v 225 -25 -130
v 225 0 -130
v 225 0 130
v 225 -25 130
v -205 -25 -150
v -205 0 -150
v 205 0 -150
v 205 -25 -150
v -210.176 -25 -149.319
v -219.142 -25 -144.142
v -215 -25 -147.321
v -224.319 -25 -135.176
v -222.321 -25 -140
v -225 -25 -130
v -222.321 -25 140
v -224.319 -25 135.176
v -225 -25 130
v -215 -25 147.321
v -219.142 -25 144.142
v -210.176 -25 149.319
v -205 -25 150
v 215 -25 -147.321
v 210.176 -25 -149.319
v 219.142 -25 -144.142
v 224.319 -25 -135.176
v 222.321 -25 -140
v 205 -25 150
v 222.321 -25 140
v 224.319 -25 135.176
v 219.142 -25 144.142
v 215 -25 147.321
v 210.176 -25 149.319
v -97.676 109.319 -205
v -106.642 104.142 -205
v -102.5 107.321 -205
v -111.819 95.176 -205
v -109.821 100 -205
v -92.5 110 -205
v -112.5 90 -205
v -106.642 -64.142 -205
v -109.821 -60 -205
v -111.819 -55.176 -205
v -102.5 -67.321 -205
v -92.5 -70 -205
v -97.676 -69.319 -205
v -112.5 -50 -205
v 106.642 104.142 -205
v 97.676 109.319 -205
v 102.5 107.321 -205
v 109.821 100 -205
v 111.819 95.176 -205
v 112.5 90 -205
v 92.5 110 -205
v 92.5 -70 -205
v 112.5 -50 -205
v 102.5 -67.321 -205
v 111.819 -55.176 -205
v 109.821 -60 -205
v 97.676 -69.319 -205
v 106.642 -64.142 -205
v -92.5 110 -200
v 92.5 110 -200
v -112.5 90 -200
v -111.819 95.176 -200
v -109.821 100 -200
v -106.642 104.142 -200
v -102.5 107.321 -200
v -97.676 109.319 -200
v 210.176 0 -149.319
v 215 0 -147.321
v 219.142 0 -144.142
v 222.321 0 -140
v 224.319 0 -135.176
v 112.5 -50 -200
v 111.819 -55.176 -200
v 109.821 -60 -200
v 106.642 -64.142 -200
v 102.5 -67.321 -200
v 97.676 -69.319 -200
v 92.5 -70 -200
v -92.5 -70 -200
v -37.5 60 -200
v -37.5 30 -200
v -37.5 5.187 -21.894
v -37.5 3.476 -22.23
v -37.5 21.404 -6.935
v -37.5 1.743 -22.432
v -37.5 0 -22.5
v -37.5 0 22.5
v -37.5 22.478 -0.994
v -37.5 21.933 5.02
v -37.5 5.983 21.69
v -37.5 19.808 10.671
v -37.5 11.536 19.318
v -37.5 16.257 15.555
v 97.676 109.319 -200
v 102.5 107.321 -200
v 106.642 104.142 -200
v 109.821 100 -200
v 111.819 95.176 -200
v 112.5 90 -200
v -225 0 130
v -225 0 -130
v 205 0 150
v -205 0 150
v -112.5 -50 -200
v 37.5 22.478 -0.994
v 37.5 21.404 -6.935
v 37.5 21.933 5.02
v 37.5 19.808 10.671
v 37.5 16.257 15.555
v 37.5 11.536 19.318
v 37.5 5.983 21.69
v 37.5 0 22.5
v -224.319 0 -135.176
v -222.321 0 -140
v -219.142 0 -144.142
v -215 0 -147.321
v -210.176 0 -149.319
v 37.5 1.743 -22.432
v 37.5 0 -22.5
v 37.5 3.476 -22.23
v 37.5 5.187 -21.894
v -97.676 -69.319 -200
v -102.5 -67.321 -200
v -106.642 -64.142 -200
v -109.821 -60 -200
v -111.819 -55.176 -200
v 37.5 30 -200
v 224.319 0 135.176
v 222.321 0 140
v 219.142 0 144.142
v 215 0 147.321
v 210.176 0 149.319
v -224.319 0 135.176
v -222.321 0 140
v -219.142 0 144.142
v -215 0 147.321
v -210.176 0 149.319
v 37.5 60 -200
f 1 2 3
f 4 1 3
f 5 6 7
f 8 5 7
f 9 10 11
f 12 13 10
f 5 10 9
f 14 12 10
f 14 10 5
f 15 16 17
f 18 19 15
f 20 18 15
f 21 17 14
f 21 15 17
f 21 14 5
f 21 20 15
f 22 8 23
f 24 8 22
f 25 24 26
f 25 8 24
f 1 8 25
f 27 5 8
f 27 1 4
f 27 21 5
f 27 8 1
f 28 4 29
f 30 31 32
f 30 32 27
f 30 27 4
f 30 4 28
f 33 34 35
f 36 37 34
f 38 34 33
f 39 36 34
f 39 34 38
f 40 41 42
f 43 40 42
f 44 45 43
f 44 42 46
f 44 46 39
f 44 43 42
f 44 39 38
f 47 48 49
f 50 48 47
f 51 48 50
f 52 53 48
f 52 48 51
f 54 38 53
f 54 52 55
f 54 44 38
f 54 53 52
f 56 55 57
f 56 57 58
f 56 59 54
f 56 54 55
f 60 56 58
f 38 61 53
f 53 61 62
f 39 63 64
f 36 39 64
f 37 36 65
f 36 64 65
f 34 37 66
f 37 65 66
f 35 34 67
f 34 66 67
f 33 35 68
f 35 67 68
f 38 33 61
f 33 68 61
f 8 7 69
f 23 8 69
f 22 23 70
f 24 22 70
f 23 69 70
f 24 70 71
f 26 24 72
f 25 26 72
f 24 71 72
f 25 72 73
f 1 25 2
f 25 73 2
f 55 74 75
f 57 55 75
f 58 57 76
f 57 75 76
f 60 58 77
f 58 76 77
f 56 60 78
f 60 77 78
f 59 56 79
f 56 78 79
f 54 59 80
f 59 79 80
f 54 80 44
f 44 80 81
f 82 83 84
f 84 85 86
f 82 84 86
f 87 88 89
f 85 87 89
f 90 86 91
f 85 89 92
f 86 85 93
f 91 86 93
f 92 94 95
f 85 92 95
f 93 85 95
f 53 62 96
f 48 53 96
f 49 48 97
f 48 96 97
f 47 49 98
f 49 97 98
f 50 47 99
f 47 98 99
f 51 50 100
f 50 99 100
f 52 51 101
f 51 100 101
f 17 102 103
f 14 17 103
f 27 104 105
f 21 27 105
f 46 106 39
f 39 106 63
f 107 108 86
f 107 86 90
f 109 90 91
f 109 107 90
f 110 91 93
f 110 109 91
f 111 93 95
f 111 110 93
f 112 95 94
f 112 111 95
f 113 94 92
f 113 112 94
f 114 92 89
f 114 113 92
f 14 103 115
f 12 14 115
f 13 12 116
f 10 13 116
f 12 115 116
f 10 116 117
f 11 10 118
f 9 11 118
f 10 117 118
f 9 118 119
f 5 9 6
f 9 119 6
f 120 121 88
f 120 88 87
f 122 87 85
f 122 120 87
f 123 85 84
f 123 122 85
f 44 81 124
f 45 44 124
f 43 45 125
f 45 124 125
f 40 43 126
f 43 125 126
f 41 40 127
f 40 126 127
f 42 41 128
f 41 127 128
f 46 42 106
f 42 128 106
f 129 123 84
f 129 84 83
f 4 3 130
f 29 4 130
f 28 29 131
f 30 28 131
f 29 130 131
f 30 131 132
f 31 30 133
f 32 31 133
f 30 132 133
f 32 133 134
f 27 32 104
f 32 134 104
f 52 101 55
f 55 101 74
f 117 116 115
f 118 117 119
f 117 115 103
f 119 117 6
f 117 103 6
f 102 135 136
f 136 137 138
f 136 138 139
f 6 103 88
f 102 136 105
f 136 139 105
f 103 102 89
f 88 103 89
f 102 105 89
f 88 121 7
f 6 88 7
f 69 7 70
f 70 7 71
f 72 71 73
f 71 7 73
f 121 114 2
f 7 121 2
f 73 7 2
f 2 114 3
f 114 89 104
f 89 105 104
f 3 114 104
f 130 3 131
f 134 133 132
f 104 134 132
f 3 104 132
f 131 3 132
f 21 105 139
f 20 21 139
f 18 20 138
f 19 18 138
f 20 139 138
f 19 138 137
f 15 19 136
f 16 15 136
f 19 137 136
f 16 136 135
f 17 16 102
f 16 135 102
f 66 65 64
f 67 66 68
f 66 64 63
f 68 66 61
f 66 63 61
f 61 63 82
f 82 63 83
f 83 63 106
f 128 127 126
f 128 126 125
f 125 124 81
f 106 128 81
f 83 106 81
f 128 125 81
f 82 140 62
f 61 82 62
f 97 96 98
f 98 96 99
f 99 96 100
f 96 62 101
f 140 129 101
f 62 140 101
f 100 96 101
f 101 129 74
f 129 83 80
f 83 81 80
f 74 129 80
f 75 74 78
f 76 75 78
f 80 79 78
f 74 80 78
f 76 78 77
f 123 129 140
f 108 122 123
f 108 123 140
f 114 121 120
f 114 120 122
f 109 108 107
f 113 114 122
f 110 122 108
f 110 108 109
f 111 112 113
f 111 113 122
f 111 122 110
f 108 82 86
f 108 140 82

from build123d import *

# Parameters (mm, degrees)
F1_DEPTH = 25
F3_DEPTH = 37.5
F5_DEPTH = 5


with BuildPart() as f1:
    # F0 (on Front) → F1 (new body)
    with BuildSketch(Plane.XZ):
        with BuildLine():
            Line((205, 150), (-205, 150))
            ThreePointArc((-205, 150), (-219.142136, 144.142136), (-225, 130))
            Line((-225, 130), (-225, -130))
            ThreePointArc((-225, -130), (-219.142136, -144.142136), (-205, -150))
            Line((-205, -150), (205, -150))
            ThreePointArc((205, -150), (219.142136, -144.142136), (225, -130))
            Line((225, -130), (225, 130))
            ThreePointArc((225, 130), (219.142136, 144.142136), (205, 150))
        make_face()
    extrude(amount=F1_DEPTH)

    # F2 (on Right) → F3 (join, symmetric)
    with BuildSketch(Plane.YZ):
        with BuildLine():
            Line((60, -200), (21.404476, -6.935301))
            ThreePointArc((21.404476, -6.935301), (-15.255166, 16.53874), (5.187273, -21.893885))
            Line((5.187273, -21.893885), (30, -200))
            Line((30, -200), (60, -200))
        make_face()
    extrude(amount=F3_DEPTH, both=True)

    # F4 (on face) → F5 (join)
    with BuildSketch(Plane(origin=(0, 0, -200), x_dir=(1, 0, 0), z_dir=(0, 0, -1))):
        with BuildLine():
            Line((92.5, 70), (-92.5, 70))
            ThreePointArc((-92.5, 70), (-106.642136, 64.142136), (-112.5, 50))
            Line((-112.5, 50), (-112.5, -90))
            ThreePointArc((-112.5, -90), (-106.642136, -104.142136), (-92.5, -110))
            Line((-92.5, -110), (92.5, -110))
            ThreePointArc((92.5, -110), (106.642136, -104.142136), (112.5, -90))
            Line((112.5, -90), (112.5, 50))
            ThreePointArc((112.5, 50), (106.642136, 64.142136), (92.5, 70))
        make_face()
    extrude(amount=F5_DEPTH)


solid = f1.part
